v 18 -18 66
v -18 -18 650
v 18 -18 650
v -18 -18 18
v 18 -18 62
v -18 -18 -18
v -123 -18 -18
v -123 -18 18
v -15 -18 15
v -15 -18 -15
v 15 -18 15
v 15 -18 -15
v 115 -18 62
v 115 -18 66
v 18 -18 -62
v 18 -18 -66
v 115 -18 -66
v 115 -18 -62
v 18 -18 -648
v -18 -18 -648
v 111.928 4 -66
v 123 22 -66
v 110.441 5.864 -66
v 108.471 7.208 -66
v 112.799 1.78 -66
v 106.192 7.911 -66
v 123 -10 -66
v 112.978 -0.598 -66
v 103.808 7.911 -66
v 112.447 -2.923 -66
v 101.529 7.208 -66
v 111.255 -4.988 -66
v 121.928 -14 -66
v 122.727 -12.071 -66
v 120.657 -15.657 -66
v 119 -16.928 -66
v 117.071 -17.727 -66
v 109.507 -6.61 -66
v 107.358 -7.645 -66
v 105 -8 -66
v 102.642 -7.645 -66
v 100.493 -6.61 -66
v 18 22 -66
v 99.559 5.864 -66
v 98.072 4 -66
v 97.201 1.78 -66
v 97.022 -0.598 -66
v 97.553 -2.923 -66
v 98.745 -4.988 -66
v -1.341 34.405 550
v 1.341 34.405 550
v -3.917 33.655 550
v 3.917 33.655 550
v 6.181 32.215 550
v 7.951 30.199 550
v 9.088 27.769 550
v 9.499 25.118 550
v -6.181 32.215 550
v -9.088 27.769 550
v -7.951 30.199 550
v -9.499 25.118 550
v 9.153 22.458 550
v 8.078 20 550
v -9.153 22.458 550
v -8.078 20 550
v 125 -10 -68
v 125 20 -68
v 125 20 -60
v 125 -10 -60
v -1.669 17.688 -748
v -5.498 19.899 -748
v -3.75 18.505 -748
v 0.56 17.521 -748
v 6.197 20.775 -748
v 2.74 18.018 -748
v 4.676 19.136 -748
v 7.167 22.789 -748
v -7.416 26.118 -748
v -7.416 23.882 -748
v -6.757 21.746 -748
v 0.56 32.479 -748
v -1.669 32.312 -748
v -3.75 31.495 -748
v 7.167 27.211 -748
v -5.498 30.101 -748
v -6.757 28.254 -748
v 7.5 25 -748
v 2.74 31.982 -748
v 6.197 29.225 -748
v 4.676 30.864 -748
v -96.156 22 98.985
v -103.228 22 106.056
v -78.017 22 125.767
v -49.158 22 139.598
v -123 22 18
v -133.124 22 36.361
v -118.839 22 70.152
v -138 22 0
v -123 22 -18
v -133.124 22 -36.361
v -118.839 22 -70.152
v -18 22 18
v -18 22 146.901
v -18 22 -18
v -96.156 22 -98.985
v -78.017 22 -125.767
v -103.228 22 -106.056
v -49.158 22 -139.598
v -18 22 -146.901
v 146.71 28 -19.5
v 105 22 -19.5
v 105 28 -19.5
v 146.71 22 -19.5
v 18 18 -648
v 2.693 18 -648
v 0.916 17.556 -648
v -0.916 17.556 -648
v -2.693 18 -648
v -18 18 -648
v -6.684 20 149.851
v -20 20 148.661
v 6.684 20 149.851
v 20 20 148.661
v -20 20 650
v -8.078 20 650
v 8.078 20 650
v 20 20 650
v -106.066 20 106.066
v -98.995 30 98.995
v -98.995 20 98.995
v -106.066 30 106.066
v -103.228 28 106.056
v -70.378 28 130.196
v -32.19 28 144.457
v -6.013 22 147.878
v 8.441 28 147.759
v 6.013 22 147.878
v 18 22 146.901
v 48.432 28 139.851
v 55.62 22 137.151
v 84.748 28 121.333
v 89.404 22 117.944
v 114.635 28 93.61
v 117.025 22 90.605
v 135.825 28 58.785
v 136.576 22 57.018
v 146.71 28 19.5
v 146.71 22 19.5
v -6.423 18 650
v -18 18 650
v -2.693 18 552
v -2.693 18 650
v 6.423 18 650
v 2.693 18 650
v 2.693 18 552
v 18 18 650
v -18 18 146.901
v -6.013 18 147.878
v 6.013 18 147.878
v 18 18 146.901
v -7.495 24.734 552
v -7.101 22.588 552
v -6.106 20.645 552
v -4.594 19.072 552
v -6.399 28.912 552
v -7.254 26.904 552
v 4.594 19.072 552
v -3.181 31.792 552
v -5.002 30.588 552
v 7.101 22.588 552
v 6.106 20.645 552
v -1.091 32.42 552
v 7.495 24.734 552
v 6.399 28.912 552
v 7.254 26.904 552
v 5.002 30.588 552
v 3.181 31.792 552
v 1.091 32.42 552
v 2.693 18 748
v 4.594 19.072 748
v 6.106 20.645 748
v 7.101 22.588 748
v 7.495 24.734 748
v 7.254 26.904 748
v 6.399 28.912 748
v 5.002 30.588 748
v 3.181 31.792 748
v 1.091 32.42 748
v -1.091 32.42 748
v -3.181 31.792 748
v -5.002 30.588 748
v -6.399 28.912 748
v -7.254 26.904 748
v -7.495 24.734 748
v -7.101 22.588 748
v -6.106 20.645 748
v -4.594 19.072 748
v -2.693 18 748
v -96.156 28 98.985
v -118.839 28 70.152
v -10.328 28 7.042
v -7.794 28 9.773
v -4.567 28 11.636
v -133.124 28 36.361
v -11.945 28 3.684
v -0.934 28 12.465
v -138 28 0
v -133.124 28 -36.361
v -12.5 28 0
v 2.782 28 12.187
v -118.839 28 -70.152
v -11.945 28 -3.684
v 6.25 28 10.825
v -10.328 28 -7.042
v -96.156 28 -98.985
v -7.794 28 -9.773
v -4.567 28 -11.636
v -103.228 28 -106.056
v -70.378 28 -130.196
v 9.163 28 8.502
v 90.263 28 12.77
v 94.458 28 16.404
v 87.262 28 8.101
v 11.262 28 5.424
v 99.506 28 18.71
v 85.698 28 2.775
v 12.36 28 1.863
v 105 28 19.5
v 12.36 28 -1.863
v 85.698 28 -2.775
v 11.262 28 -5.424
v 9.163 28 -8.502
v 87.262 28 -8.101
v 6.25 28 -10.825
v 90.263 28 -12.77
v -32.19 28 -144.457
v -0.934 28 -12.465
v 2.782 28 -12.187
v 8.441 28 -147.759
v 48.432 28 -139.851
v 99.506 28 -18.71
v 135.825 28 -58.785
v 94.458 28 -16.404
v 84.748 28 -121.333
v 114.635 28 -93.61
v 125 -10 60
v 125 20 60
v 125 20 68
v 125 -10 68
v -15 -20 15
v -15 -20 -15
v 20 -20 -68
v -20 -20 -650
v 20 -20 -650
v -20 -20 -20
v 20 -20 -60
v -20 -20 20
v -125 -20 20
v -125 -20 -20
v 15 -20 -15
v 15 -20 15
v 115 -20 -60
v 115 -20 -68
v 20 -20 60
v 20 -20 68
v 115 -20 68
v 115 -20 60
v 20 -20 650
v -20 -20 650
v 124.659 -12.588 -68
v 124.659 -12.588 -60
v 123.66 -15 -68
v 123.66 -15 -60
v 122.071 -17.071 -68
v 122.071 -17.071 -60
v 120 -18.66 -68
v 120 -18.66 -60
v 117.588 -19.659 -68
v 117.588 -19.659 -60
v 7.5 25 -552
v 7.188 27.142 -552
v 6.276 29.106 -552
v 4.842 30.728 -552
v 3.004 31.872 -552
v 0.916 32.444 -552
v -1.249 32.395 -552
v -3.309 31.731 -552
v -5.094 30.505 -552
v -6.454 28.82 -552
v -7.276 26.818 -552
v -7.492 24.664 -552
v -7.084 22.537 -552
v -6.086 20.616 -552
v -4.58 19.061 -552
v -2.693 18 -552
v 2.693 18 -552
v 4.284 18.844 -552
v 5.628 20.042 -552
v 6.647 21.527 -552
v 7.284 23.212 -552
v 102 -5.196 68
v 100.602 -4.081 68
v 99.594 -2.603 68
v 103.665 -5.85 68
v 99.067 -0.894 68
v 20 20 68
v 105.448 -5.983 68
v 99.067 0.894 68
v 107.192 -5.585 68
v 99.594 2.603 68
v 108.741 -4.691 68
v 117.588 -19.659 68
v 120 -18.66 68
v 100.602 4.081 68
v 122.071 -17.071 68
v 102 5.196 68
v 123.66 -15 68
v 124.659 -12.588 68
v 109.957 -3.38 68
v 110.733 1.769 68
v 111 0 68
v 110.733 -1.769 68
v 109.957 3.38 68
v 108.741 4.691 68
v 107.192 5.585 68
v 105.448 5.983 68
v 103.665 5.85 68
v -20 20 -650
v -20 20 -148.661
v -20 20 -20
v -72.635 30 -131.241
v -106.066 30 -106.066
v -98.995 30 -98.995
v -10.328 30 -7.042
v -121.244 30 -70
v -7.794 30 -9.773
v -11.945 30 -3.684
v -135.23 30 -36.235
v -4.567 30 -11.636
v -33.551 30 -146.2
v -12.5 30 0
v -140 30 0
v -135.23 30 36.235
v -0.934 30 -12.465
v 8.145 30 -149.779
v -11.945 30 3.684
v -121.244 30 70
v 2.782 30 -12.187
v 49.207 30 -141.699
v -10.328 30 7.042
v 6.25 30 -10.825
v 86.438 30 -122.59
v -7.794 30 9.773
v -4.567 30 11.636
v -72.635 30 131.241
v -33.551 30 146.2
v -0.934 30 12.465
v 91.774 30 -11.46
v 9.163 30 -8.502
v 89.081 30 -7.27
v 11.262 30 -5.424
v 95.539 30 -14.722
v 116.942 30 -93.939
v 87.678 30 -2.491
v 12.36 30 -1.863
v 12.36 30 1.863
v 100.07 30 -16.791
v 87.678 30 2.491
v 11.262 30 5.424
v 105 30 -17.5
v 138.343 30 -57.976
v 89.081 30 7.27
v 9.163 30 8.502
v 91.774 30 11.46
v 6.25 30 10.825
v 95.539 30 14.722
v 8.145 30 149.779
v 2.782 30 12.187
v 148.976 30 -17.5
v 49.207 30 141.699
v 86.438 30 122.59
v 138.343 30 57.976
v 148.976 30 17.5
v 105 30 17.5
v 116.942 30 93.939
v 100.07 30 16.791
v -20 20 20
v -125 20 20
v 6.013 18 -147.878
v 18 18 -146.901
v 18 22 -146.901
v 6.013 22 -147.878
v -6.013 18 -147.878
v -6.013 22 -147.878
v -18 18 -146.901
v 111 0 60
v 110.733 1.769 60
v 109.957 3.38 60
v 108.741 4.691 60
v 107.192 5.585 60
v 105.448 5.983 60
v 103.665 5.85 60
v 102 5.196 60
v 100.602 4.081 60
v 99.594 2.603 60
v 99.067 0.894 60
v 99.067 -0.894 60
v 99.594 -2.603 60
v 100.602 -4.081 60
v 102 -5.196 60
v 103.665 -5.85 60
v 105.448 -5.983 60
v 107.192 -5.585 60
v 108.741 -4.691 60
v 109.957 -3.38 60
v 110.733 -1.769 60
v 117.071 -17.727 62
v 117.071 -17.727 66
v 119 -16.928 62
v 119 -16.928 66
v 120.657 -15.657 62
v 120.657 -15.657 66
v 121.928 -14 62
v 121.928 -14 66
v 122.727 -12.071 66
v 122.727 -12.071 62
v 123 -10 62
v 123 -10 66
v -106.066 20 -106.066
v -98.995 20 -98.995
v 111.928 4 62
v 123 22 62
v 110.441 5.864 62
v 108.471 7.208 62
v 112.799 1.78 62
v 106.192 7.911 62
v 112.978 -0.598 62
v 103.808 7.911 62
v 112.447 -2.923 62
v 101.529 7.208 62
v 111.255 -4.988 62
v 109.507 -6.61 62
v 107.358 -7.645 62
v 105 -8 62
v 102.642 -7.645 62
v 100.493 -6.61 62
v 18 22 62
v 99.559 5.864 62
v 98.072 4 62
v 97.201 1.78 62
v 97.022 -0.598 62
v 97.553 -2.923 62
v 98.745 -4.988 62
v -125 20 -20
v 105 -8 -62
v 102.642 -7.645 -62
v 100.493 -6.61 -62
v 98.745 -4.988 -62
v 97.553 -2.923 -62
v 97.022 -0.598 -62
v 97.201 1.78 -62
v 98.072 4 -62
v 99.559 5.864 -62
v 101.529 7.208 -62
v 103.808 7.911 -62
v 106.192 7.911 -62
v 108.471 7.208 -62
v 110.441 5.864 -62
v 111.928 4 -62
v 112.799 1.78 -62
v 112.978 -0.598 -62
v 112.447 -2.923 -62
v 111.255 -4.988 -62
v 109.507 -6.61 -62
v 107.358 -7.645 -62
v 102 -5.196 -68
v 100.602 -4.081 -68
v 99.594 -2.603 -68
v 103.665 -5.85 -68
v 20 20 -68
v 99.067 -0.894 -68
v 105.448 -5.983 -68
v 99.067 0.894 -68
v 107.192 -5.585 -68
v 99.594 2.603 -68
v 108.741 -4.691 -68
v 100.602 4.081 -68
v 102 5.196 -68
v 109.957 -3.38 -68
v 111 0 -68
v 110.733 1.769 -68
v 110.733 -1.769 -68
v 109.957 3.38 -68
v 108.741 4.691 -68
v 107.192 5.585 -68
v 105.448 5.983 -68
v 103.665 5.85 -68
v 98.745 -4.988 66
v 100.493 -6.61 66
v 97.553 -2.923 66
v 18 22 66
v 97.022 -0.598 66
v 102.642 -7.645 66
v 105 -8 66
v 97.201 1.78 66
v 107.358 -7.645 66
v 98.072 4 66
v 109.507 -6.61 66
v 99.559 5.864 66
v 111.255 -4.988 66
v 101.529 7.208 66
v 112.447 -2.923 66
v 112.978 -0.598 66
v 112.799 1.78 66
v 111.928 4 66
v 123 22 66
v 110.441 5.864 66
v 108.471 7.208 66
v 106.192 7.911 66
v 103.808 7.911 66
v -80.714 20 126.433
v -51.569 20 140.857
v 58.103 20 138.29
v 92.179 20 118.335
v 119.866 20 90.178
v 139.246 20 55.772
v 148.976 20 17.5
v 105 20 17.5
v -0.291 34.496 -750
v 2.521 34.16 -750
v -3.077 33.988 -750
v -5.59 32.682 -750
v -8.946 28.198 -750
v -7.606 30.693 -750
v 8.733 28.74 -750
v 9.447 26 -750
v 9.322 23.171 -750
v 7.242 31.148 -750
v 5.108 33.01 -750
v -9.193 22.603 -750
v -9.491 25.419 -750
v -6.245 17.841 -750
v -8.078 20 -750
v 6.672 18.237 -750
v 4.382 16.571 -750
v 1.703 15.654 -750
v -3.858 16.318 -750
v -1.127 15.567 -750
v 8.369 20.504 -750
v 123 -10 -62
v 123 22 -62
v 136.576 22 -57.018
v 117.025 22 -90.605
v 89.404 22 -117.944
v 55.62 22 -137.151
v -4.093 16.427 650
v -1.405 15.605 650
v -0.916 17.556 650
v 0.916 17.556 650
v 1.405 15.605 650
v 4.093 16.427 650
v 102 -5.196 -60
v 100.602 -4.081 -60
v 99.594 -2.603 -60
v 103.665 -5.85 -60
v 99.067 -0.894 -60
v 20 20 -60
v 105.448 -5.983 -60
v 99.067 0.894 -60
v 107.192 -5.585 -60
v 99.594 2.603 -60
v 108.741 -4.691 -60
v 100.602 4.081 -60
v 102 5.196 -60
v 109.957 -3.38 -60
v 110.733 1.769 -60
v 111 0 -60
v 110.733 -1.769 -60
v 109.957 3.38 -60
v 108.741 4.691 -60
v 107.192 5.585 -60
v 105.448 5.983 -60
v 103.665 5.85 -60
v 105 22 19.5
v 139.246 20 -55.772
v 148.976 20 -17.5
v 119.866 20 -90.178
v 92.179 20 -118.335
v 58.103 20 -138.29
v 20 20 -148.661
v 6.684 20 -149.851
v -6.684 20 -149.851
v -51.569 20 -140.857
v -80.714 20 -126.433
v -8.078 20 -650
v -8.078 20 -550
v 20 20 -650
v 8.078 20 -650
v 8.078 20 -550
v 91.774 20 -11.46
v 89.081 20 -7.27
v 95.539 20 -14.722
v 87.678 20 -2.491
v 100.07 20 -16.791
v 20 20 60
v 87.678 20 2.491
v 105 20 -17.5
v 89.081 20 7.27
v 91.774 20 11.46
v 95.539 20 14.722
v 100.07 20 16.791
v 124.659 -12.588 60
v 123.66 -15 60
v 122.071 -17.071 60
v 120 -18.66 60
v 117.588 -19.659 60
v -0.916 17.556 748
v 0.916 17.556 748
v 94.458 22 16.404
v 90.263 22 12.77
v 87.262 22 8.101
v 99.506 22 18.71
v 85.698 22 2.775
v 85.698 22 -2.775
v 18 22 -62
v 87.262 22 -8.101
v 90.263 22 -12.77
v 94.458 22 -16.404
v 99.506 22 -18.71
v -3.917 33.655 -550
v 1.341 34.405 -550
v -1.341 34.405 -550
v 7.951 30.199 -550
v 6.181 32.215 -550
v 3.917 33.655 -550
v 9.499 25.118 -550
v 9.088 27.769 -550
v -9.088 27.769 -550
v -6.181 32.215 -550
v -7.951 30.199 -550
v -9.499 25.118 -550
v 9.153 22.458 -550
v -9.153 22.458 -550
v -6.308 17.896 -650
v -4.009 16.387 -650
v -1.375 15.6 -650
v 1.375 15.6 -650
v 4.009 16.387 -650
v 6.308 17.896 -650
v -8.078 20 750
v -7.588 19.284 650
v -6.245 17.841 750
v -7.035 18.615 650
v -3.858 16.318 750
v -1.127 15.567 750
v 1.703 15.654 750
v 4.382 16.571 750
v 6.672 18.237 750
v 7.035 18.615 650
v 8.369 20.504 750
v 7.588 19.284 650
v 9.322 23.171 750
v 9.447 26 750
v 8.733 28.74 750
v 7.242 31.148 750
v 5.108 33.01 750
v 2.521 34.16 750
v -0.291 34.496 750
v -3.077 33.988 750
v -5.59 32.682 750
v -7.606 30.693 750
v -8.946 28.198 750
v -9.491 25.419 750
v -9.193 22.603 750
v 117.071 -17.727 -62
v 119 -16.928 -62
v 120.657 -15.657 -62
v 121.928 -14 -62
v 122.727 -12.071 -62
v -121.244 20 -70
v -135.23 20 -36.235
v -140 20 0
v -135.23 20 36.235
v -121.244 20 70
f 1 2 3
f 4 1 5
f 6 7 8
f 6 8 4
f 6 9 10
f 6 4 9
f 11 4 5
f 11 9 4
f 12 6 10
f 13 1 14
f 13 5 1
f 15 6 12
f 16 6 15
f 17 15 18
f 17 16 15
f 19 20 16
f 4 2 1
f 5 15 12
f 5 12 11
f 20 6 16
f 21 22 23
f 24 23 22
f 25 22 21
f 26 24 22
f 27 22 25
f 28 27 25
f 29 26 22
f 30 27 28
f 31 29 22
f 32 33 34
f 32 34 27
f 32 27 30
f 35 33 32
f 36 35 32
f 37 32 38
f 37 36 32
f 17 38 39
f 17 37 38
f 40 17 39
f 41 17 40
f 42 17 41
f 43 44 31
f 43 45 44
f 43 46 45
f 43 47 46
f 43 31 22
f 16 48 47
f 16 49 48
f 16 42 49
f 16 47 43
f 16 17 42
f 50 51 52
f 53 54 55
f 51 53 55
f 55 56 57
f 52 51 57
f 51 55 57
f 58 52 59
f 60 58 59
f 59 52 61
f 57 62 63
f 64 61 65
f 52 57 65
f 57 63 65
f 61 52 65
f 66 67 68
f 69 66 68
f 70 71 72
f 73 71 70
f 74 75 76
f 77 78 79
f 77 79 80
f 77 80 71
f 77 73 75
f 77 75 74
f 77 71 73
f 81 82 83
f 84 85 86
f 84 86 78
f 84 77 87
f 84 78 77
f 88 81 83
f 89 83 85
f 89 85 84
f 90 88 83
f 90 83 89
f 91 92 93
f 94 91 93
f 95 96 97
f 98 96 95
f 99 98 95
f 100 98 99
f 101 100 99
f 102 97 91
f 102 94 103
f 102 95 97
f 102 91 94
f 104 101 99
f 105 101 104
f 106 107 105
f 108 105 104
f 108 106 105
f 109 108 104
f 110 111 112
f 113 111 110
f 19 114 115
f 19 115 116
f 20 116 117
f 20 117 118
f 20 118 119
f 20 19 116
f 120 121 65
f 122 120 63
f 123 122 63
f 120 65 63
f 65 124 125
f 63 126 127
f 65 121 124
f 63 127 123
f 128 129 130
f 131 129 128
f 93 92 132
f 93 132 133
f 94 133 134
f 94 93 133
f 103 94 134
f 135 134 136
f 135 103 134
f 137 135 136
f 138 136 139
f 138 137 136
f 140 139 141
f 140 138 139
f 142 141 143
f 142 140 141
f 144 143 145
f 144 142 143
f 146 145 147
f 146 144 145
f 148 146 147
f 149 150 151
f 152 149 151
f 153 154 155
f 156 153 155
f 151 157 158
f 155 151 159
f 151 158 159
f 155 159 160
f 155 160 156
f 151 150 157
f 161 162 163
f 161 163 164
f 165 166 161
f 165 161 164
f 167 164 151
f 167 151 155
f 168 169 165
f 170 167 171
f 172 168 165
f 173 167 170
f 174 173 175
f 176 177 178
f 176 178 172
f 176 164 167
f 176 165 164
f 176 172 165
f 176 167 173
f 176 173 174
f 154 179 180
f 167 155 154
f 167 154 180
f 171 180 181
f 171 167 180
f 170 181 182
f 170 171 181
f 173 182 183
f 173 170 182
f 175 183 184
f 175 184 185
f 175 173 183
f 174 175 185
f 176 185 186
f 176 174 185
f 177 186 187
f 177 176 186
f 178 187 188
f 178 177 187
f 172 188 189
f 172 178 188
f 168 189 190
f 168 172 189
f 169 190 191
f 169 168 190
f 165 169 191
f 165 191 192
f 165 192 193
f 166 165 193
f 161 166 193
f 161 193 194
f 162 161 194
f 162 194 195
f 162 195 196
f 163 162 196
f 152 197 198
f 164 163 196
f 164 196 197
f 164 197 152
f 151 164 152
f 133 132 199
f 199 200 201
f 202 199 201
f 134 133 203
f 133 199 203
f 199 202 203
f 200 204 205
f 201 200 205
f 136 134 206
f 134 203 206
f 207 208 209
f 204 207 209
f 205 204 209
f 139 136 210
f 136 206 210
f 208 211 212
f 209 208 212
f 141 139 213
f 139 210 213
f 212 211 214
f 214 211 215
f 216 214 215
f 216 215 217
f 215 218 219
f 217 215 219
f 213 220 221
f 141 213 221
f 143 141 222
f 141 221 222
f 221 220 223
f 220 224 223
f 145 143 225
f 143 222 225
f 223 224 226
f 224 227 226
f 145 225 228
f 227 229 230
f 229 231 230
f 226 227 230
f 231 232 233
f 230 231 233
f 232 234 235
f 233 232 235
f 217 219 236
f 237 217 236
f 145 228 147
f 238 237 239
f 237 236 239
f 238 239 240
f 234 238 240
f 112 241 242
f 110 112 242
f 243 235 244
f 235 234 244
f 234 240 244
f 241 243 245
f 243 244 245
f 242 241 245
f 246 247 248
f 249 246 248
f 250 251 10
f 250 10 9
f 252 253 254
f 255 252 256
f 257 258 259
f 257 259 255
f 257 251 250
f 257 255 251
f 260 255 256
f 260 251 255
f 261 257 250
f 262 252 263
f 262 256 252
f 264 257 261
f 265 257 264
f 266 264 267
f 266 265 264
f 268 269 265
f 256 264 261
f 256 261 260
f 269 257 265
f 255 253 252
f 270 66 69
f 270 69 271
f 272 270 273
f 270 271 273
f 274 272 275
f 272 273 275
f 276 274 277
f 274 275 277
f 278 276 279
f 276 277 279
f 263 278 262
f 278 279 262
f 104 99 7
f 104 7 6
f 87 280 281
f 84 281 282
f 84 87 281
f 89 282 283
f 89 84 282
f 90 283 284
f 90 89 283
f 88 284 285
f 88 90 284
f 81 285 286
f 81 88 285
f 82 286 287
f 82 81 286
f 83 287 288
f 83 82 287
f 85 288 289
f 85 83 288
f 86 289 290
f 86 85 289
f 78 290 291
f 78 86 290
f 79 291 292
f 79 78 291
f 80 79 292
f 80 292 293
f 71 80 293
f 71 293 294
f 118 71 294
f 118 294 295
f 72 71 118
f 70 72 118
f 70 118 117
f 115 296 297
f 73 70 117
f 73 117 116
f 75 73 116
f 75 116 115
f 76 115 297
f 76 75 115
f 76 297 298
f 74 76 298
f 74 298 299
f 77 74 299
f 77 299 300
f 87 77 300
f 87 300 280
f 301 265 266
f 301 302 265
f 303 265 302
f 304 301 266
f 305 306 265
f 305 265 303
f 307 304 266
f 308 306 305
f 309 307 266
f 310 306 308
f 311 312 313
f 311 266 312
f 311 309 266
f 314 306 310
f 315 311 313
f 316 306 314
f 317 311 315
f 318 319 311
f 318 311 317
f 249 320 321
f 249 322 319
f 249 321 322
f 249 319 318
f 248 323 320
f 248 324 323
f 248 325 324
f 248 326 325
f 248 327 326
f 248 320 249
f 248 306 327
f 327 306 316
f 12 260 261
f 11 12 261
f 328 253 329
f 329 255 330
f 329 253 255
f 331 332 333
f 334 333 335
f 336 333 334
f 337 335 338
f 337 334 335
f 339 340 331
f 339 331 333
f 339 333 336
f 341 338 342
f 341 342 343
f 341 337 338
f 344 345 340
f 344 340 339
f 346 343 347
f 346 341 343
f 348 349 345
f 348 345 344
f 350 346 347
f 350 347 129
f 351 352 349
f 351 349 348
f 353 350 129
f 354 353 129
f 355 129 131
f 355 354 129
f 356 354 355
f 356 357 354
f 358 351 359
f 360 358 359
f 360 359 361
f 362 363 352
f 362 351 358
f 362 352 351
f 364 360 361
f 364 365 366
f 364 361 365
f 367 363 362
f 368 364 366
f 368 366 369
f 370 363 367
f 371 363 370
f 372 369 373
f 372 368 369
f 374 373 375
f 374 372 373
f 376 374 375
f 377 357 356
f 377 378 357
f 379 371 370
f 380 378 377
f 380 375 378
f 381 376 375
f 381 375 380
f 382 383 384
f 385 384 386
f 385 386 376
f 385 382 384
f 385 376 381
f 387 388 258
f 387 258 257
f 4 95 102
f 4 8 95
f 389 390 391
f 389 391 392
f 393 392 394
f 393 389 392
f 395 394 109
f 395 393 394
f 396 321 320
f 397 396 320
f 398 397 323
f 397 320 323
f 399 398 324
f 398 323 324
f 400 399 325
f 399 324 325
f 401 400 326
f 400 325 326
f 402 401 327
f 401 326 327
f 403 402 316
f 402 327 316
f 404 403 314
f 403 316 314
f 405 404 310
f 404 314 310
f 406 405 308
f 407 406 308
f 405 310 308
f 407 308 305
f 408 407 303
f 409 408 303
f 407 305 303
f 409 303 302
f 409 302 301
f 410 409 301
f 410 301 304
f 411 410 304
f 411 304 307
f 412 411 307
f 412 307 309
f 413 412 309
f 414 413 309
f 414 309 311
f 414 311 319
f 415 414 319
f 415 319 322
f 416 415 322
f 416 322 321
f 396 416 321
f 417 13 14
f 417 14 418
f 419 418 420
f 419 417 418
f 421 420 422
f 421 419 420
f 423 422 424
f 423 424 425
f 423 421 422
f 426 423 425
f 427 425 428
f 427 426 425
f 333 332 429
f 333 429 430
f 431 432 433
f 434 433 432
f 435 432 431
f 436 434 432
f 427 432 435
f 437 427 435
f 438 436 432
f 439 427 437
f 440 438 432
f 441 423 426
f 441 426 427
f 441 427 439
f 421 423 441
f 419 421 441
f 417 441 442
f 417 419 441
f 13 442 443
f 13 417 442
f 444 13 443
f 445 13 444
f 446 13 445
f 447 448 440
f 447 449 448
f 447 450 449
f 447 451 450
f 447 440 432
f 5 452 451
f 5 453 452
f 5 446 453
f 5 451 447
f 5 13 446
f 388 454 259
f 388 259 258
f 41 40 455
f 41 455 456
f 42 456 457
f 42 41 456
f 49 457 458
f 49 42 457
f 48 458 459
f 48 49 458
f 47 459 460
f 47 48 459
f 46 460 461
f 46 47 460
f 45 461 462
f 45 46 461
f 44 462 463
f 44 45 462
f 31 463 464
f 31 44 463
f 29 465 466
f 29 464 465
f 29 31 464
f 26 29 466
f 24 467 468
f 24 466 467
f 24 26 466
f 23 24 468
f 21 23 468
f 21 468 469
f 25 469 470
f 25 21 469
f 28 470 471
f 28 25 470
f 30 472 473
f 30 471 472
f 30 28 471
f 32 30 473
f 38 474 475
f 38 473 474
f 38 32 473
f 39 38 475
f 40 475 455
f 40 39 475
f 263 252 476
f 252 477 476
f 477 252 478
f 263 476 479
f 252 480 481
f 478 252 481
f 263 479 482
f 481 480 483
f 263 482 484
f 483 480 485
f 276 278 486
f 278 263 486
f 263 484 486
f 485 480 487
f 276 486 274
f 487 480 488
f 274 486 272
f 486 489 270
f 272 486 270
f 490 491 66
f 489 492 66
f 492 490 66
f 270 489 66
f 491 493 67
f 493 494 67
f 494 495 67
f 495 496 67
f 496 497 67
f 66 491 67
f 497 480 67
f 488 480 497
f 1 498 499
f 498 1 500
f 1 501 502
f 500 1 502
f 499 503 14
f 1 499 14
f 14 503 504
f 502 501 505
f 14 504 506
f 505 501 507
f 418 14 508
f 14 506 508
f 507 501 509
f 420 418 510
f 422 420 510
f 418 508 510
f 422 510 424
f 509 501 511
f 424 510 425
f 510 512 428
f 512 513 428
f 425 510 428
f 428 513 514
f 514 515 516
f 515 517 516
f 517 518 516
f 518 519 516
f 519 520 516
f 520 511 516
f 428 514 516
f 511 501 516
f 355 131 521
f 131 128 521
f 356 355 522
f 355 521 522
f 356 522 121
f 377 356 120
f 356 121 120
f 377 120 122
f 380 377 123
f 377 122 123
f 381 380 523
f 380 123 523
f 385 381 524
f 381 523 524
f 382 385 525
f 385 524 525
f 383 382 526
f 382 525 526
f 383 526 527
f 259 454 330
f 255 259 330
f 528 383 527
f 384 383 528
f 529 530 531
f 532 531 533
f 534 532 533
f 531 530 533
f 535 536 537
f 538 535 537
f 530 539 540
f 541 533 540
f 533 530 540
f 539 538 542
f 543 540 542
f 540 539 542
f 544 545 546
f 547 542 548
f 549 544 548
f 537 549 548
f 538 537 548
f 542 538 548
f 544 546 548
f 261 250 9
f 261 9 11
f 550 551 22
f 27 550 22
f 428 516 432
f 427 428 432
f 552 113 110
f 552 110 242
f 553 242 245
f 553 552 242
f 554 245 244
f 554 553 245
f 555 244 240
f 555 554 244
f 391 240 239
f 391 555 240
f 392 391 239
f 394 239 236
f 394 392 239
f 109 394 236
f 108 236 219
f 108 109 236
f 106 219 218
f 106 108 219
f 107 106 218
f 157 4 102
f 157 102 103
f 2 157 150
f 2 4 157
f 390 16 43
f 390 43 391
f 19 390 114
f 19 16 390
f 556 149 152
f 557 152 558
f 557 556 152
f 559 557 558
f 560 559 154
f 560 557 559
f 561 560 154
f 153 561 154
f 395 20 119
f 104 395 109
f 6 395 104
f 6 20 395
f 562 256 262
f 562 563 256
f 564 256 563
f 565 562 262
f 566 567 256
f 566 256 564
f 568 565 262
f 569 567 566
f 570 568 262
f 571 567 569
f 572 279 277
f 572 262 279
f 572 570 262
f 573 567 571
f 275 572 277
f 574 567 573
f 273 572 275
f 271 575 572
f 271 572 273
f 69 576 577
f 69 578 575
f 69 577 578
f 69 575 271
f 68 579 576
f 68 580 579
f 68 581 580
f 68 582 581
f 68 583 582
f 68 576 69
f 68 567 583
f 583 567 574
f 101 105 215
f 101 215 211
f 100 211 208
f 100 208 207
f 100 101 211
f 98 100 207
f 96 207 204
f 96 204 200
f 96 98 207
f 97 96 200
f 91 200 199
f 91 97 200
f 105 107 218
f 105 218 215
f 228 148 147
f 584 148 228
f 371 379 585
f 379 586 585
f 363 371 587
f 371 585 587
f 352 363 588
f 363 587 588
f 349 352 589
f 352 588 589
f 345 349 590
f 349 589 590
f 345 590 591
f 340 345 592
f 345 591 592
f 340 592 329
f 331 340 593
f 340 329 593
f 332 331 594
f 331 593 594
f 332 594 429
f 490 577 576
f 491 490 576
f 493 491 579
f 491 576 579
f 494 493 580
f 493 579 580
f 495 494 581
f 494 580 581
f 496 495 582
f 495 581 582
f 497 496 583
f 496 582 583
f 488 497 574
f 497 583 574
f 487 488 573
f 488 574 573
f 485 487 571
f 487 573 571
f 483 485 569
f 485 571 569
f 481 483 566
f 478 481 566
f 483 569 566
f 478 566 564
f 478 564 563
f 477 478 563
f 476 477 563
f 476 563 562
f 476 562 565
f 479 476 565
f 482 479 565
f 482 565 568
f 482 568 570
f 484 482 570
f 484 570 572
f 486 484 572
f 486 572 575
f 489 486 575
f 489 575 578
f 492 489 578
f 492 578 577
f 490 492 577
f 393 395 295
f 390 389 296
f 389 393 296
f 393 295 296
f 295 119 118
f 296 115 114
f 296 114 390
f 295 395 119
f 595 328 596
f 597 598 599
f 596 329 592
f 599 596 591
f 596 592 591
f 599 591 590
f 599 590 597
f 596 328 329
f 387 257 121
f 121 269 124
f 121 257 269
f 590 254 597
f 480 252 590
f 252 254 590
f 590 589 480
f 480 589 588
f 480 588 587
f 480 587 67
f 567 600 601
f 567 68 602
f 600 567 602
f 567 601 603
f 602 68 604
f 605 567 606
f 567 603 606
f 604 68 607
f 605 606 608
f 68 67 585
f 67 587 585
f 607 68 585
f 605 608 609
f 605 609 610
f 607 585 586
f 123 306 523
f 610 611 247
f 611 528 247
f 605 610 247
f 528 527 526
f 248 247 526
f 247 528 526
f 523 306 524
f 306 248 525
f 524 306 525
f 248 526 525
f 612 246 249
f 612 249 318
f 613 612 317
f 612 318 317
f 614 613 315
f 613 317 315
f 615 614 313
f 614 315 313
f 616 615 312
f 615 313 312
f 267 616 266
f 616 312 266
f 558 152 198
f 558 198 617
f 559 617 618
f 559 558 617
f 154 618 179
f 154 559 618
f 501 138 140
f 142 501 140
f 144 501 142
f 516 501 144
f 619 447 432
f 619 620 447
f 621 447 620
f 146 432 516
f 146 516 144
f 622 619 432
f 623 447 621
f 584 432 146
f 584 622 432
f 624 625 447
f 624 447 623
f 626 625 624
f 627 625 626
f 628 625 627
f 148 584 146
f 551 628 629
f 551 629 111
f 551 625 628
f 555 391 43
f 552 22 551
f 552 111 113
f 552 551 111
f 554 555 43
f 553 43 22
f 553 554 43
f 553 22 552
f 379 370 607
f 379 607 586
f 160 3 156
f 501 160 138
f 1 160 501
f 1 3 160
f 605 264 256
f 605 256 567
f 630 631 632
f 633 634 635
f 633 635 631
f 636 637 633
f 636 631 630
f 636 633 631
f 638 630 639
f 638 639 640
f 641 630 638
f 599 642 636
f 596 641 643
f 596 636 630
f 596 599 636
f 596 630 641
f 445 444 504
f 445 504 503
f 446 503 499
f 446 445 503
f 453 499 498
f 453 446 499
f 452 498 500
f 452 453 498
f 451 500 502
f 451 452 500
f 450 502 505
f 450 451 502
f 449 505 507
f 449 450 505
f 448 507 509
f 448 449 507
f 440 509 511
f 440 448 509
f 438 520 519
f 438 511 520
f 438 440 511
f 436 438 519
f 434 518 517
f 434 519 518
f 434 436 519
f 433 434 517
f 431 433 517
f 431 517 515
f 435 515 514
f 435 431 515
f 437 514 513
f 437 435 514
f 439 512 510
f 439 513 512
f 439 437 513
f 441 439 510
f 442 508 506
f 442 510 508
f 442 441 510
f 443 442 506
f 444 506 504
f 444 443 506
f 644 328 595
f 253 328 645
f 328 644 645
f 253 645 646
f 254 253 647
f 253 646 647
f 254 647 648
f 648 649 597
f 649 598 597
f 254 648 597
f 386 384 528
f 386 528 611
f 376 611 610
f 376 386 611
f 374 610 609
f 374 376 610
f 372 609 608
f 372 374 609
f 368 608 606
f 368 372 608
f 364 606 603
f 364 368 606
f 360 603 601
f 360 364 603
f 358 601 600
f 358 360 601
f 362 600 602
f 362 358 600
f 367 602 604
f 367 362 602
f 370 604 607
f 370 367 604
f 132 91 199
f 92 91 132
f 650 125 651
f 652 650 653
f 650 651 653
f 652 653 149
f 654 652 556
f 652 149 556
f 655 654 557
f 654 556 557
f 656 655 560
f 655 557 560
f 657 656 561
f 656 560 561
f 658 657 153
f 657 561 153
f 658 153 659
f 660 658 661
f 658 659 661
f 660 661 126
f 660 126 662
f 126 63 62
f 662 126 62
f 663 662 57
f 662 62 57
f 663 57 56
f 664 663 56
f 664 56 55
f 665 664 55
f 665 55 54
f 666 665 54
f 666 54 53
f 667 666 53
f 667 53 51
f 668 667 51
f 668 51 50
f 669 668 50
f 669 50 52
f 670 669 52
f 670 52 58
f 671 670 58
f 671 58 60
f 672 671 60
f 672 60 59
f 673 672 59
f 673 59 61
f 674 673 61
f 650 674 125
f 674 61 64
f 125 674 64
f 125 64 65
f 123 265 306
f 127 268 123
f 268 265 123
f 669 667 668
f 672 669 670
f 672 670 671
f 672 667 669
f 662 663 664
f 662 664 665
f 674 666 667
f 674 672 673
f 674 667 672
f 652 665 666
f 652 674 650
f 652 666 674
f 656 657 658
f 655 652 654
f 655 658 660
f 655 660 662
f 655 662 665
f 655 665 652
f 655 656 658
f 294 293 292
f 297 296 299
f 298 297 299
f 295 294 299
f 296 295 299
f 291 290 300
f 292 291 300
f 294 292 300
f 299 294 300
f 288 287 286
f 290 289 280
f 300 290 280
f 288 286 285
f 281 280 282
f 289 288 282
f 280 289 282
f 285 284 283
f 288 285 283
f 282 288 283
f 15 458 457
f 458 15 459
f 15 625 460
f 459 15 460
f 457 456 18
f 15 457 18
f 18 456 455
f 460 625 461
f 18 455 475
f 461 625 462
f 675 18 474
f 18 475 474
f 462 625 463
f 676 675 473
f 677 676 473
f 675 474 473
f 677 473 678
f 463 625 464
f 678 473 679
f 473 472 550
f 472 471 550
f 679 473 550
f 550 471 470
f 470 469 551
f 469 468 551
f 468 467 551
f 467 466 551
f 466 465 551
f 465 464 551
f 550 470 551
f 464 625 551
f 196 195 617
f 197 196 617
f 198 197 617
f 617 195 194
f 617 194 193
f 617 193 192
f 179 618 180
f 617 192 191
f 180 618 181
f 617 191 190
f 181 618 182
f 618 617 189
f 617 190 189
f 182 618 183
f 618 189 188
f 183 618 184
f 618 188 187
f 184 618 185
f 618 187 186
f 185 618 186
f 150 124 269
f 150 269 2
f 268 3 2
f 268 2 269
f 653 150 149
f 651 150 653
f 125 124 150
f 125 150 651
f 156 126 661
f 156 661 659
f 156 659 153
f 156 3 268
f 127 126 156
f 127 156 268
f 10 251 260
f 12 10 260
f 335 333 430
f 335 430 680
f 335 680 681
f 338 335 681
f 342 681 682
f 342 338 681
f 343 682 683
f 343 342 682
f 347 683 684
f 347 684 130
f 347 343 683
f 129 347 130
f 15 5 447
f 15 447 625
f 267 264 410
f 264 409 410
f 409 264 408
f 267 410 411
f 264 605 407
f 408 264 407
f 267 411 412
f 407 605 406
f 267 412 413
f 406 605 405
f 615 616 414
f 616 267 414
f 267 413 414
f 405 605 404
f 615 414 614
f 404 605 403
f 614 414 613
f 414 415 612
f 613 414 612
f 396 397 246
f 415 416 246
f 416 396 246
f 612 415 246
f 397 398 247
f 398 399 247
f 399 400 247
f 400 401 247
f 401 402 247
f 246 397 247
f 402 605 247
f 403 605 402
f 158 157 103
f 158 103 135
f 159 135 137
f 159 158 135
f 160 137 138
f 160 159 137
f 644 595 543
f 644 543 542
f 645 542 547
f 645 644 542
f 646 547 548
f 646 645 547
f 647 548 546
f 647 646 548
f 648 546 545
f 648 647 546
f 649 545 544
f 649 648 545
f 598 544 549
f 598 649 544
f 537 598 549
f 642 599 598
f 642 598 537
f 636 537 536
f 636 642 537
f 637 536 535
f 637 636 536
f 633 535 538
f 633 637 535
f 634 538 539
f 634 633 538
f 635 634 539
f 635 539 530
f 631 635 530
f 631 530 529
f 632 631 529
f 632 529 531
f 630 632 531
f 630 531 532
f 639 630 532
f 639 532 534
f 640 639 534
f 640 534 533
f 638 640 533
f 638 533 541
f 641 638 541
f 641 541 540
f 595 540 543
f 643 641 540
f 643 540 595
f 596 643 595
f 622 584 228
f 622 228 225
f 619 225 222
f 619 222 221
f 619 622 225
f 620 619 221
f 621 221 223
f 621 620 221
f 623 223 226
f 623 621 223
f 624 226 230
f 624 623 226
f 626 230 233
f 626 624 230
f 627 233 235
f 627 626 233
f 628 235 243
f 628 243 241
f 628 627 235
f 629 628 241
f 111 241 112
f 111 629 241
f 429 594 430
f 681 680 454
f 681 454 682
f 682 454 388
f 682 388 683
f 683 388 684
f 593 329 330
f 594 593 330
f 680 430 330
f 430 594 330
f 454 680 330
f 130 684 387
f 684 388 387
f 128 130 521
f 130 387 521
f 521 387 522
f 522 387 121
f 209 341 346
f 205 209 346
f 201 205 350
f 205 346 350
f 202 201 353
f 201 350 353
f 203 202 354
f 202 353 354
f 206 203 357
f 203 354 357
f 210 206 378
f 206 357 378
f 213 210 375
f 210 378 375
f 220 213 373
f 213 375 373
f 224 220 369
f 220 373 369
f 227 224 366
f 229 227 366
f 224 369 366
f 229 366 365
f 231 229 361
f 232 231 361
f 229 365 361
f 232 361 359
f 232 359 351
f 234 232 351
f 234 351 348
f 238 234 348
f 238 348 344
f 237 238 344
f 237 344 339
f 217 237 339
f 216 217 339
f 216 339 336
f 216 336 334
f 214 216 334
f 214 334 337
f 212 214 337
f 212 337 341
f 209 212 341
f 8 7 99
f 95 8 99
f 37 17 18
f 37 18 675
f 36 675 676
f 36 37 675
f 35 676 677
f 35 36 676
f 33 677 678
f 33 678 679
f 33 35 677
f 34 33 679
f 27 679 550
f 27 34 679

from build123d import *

# Parameters (mm, degrees)
SKETCH1_W            = 40
SKETCH1_H            = 40
BOSS_EXTRUDE1_DEPTH  = 650
BOSS_EXTRUDE2_START  = 550
SKETCH3_R            = 9.5
BOSS_EXTRUDE2_DEPTH  = 200
SKETCH8_R            = 150
BOSS_EXTRUDE3_DEPTH  = 10
SKETCH9_W            = 105
SKETCH9_H            = 8
SKETCH9_H_2          = 40
BOSS_EXTRUDE4_DEPTH  = 40
FILLET1_R            = 10
SKETCH10_R           = 6
CUT_EXTRUDE1_DEPTH   = 735.31209305
CUT_EXTRUDE2_DEPTH   = 767.485485838
CUT_EXTRUDE5_DEPTH   = 767.485485838
SHELL2_START         = -18
SHELL2_DEPTH         = 36
SHELL2_START_2       = 22
SHELL2_2_DEPTH       = 6
SHELL2_START_3       = 8.0000001
SHELL2_3_DEPTH       = 13.9999999
SHELL2_START_4       = -10
SHELL2_4_DEPTH       = 1.9999999
SHELL2_START_5       = -552
SHELL2_5_OUTLINE_W   = 36
SHELL2_5_OUTLINE_H   = 8
SHELL2_5_OUTLINE_H_2 = 16.0000002
SHELL2_5_DEPTH       = 1300
SHELL2_6_OUTLINE_W   = 105
SHELL2_6_OUTLINE_H   = 8
SHELL2_6_OUTLINE_H_2 = 16.0000002
SHELL2_6_DEPTH       = 36
SHELL2_START_6       = -748
SHELL2_7_OUTLINE_R   = 7.5
SHELL2_7_DEPTH       = 196
SHELL2_START_7       = 552
SHELL2_8_DEPTH       = 196
SHELL2_START_8       = -66
SHELL2_9_DEPTH       = 4
SHELL2_START_9       = 62
SHELL2_10_DEPTH      = 4
SKETCH12_R           = 12.5
CUT_EXTRUDE3_DEPTH   = 70
SKETCH13_W           = 30
SKETCH13_H           = 30
CUT_EXTRUDE4_DEPTH   = 20


with BuildPart() as part:
    # Sketch1 → Boss-Extrude1 (new, symmetric)
    with BuildSketch(Plane.XY):
        Rectangle(SKETCH1_W, SKETCH1_H)
    extrude(amount=BOSS_EXTRUDE1_DEPTH, both=True)

    # Sketch3 → Boss-Extrude2 (add)
    with BuildSketch(Plane.XY.offset(BOSS_EXTRUDE2_START)):
        with Locations(Location((0, 25, 0), (0, 0, 211.756863859))):
            Circle(SKETCH3_R)
    boss_extrude2 = extrude(amount=BOSS_EXTRUDE2_DEPTH)

    # Sketch8 → Boss-Extrude3 (add)
    with BuildSketch(Plane(origin=(0, 20, 0), x_dir=(1, 0, 0), z_dir=(0, 1, 0))):
        with Locations(Location((0, 0, 0), (0, 0, 277.662255661))):
            Circle(SKETCH8_R)
    extrude(amount=BOSS_EXTRUDE3_DEPTH)

    # Sketch9 → Boss-Extrude4 (add)
    with BuildSketch(Plane.XZ.offset(-20)):
        with Locations((72.5, -64)):
            Rectangle(SKETCH9_W, SKETCH9_H)
        with Locations((72.5, 64)):
            Rectangle(SKETCH9_W, SKETCH9_H)
        with Locations((-72.5, 0)):
            Rectangle(SKETCH9_W, SKETCH9_H_2)
    extrude(amount=BOSS_EXTRUDE4_DEPTH)

    # Fillet1
    fillet1_edges = [part.edges().sort_by_distance(p)[0] for p in [
        (125, -20, -64),
        (125, -20, 64),
    ]]
    fillet(fillet1_edges, radius=FILLET1_R)

    # Sketch10 → Cut-Extrude1 (cut, through all)
    with BuildSketch(Plane.XY.offset(68)):
        with Locations((105, 0)):
            Circle(SKETCH10_R)
    extrude(amount=-CUT_EXTRUDE1_DEPTH, mode=Mode.SUBTRACT)

    # Sketch11 → Cut-Extrude2 (cut, through all)
    with BuildSketch(Plane(origin=(0, 30, 0), x_dir=(1, 0, 0), z_dir=(0, 1, 0))):
        with BuildLine():
            Line((105, 17.5), (150, 17.5))
            Line((150, 17.5), (150, -17.5))
            Line((150, -17.5), (105, -17.5))
            ThreePointArc((105, -17.5), (87.5, 0), (105, 17.5))
        make_face()
    extrude(amount=-CUT_EXTRUDE2_DEPTH, mode=Mode.SUBTRACT)

    # Mirror1: Boss-Extrude2 across plane
    add(boss_extrude2.mirror(Plane.XY))

    # Sketch14 → Cut-Extrude5 (cut, through all)
    with BuildSketch(Plane(origin=(0, 30, 0), x_dir=(1, 0, 0), z_dir=(0, 1, 0))):
        with BuildLine():
            Line((-106.066017178, 106.066017178), (-98.994949366, 98.994949366))
            ThreePointArc((-98.994949366, 98.994949366), (-140, 0), (-98.994949366, -98.994949366))
            Line((-98.994949366, -98.994949366), (-106.066017178, -106.066017178))
            ThreePointArc((-106.066017178, -106.066017178), (-150, 0), (-106.066017178, 106.066017178))
        make_face()
    extrude(amount=-CUT_EXTRUDE5_DEPTH, mode=Mode.SUBTRACT)

    # Shell2: read off the stored shape, not the designer's step
    # Shell2 outline → Shell2 (cut)
    with BuildSketch(Plane(origin=(0, 0, 0), x_dir=(1, 0, 0), z_dir=(0, 1, 0)).offset(SHELL2_START)):
        with BuildLine():
            Line((-18, 648), (-18, 146.901327428))
            ThreePointArc((-18, 146.901327428), (0, 148), (18, 146.901327428))
            Line((18, 146.901327428), (18, 648))
            Line((18, 648), (-18, 648))
        make_face()
        with BuildLine():
            ThreePointArc((18, -146.901327428), (0, -148), (-18, -146.901327428))
            Line((-18, -146.901327428), (-18, -650))
            Line((-18, -650), (18, -650))
            Line((18, -650), (18, -146.901327428))
        make_face()
    extrude(amount=SHELL2_DEPTH, mode=Mode.SUBTRACT)

    # Shell2 2 outline → Shell2 2 (cut)
    with BuildSketch(Plane(origin=(0, 0, 0), x_dir=(1, 0, 0), z_dir=(0, 1, 0)).offset(SHELL2_START_2)):
        with BuildLine():
            Line((-103.22803412, 106.056461245), (-96.156273779, 98.984700904))
            ThreePointArc((-96.156273779, 98.984700904), (-138, 0), (-96.156273779, -98.984700904))
            Line((-96.156273779, -98.984700904), (-103.22803412, -106.056461245))
            ThreePointArc((-103.22803412, -106.056461245), (48.432118419, -139.85109905), (146.709747461, -19.5))
            Line((146.709747461, -19.5), (105, -19.5))
            ThreePointArc((105, -19.5), (85.5, 0), (105, 19.5))
            Line((105, 19.5), (146.709747461, 19.5))
            ThreePointArc((146.709747461, 19.5), (48.432118419, 139.85109905), (-103.22803412, 106.056461245))
        make_face()
    extrude(amount=SHELL2_2_DEPTH, mode=Mode.SUBTRACT)

    # Shell2 3 outline → Shell2 3 (cut)
    with BuildSketch(Plane(origin=(0, 0, 0), x_dir=(1, 0, 0), z_dir=(0, 1, 0)).offset(SHELL2_START_3)):
        with BuildLine():
            ThreePointArc((18, 146.901327428), (0, 148), (-18, 146.901327428))
            Line((-18, 146.901327428), (-18, 18))
            Line((-18, 18), (-123, 18))
            Line((-123, 18), (-123, -18))
            Line((-123, -18), (-18, -18))
            Line((-18, -18), (-18, -146.901327428))
            ThreePointArc((-18, -146.901327428), (0, -148), (18, -146.901327428))
            Line((18, -146.901327428), (18, -66))
            Line((18, -66), (123, -66))
            Line((123, -66), (123, -62))
            Line((123, -62), (18, -62))
            Line((18, -62), (18, 62))
            Line((18, 62), (123, 62))
            Line((123, 62), (123, 66))
            Line((123, 66), (18, 66))
            Line((18, 66), (18, 146.901327428))
        make_face()
    extrude(amount=SHELL2_3_DEPTH, mode=Mode.SUBTRACT)

    # Shell2 4 outline → Shell2 4 (cut)
    with BuildSketch(Plane(origin=(0, 0, 0), x_dir=(1, 0, 0), z_dir=(0, 1, 0)).offset(SHELL2_START_4)):
        with BuildLine():
            ThreePointArc((18, 146.901327428), (0, 148), (-18, 146.901327428))
            Line((-18, 146.901327428), (-18, 18))
            Line((-18, 18), (-123, 18))
            Line((-123, 18), (-123, -18))
            Line((-123, -18), (-18, -18))
            Line((-18, -18), (-18, -146.901327428))
            ThreePointArc((-18, -146.901327428), (0, -148), (18, -146.901327428))
            Line((18, -146.901327428), (18, -66))
            Line((18, -66), (123, -66))
            Line((123, -66), (123, -62))
            Line((123, -62), (18, -62))
            Line((18, -62), (18, 62))
            Line((18, 62), (123, 62))
            Line((123, 62), (123, 66))
            Line((123, 66), (18, 66))
            Line((18, 66), (18, 146.901327428))
        make_face()
    extrude(amount=SHELL2_4_DEPTH, mode=Mode.SUBTRACT)

    # Shell2 5 outline → Shell2 5 (cut)
    with BuildSketch(Plane.XY.offset(SHELL2_START_5)):
        with Locations((0, -14)):
            Rectangle(SHELL2_5_OUTLINE_W, SHELL2_5_OUTLINE_H)
        Rectangle(SHELL2_5_OUTLINE_W, SHELL2_5_OUTLINE_H_2)
        with BuildLine():
            Line((2.692582404, 18), (-2.692582404, 18))
            ThreePointArc((-2.692582404, 18), (0, 17.5), (2.692582404, 18))
        make_face()
    extrude(amount=SHELL2_5_DEPTH, mode=Mode.SUBTRACT)

    # Shell2 6 outline → Shell2 6 (cut)
    with BuildSketch(Plane.XY.offset(SHELL2_START)):
        with Locations((-70.5, -14)):
            Rectangle(SHELL2_6_OUTLINE_W, SHELL2_6_OUTLINE_H)
        with Locations((-70.5, 0)):
            Rectangle(SHELL2_6_OUTLINE_W, SHELL2_6_OUTLINE_H_2)
    extrude(amount=SHELL2_6_DEPTH, mode=Mode.SUBTRACT)

    # Shell2 7 outline → Shell2 7 (cut)
    with BuildSketch(Plane.XY.offset(SHELL2_START_6)):
        with Locations((0, 25)):
            Circle(SHELL2_7_OUTLINE_R)
    extrude(amount=SHELL2_7_DEPTH, mode=Mode.SUBTRACT)

    # Shell2 8 outline → Shell2 8 (cut)
    with BuildSketch(Plane.XY.offset(SHELL2_START_7)):
        with BuildLine():
            ThreePointArc((2.692582404, 18), (0, 32.5), (-2.692582404, 18))
            Line((-2.692582404, 18), (2.692582404, 18))
        make_face()
    extrude(amount=SHELL2_8_DEPTH, mode=Mode.SUBTRACT)

    # Shell2 9 outline → Shell2 9 (cut)
    with BuildSketch(Plane.XY.offset(SHELL2_START_8)):
        with BuildLine():
            Line((18, -10), (18, -18))
            Line((18, -18), (115, -18))
            ThreePointArc((115, -18), (120.656854249, -15.656854249), (123, -10))
            Line((123, -10), (18, -10))
        make_face()
        with BuildLine():
            Line((18, 8.0000001), (18, -8.0000001))
            Line((18, -8.0000001), (105, -8))
            ThreePointArc((105, -8), (97, 0), (105, 8))
            Line((105, 8), (18, 8.0000001))
        make_face()
        with BuildLine():
            ThreePointArc((105, 8), (113, 0), (105, -8))
            Line((105, -8), (123, -8.0000001))
            Line((123, -8.0000001), (123, 8.0000001))
            Line((123, 8.0000001), (105, 8))
        make_face()
    extrude(amount=SHELL2_9_DEPTH, mode=Mode.SUBTRACT)

    # Shell2 10 outline → Shell2 10 (cut)
    with BuildSketch(Plane.XY.offset(SHELL2_START_9)):
        with BuildLine():
            Line((18, -10), (18, -18))
            Line((18, -18), (115, -18))
            ThreePointArc((115, -18), (120.656854249, -15.656854249), (123, -10))
            Line((123, -10), (18, -10))
        make_face()
        with BuildLine():
            Line((18, 8.0000001), (18, -8.0000001))
            Line((18, -8.0000001), (105, -8))
            ThreePointArc((105, -8), (97, 0), (105, 8))
            Line((105, 8), (18, 8.0000001))
        make_face()
        with BuildLine():
            ThreePointArc((105, 8), (113, 0), (105, -8))
            Line((105, -8), (123, -8.0000001))
            Line((123, -8.0000001), (123, 8.0000001))
            Line((123, 8.0000001), (105, 8))
        make_face()
    extrude(amount=SHELL2_10_DEPTH, mode=Mode.SUBTRACT)

    # Sketch12 → Cut-Extrude3 (cut)
    with BuildSketch(Plane(origin=(0, 30, 0), x_dir=(1, 0, 0), z_dir=(0, 1, 0))):
        with Locations(Location((0, 0, 0), (0, 0, 180))):
            Circle(SKETCH12_R)
    extrude(amount=-CUT_EXTRUDE3_DEPTH, mode=Mode.SUBTRACT)

    # Sketch13 → Cut-Extrude4 (cut)
    with BuildSketch(Plane.XZ.offset(20)):
        Rectangle(SKETCH13_W, SKETCH13_H)
    extrude(amount=-CUT_EXTRUDE4_DEPTH, mode=Mode.SUBTRACT)


solid = part.part
